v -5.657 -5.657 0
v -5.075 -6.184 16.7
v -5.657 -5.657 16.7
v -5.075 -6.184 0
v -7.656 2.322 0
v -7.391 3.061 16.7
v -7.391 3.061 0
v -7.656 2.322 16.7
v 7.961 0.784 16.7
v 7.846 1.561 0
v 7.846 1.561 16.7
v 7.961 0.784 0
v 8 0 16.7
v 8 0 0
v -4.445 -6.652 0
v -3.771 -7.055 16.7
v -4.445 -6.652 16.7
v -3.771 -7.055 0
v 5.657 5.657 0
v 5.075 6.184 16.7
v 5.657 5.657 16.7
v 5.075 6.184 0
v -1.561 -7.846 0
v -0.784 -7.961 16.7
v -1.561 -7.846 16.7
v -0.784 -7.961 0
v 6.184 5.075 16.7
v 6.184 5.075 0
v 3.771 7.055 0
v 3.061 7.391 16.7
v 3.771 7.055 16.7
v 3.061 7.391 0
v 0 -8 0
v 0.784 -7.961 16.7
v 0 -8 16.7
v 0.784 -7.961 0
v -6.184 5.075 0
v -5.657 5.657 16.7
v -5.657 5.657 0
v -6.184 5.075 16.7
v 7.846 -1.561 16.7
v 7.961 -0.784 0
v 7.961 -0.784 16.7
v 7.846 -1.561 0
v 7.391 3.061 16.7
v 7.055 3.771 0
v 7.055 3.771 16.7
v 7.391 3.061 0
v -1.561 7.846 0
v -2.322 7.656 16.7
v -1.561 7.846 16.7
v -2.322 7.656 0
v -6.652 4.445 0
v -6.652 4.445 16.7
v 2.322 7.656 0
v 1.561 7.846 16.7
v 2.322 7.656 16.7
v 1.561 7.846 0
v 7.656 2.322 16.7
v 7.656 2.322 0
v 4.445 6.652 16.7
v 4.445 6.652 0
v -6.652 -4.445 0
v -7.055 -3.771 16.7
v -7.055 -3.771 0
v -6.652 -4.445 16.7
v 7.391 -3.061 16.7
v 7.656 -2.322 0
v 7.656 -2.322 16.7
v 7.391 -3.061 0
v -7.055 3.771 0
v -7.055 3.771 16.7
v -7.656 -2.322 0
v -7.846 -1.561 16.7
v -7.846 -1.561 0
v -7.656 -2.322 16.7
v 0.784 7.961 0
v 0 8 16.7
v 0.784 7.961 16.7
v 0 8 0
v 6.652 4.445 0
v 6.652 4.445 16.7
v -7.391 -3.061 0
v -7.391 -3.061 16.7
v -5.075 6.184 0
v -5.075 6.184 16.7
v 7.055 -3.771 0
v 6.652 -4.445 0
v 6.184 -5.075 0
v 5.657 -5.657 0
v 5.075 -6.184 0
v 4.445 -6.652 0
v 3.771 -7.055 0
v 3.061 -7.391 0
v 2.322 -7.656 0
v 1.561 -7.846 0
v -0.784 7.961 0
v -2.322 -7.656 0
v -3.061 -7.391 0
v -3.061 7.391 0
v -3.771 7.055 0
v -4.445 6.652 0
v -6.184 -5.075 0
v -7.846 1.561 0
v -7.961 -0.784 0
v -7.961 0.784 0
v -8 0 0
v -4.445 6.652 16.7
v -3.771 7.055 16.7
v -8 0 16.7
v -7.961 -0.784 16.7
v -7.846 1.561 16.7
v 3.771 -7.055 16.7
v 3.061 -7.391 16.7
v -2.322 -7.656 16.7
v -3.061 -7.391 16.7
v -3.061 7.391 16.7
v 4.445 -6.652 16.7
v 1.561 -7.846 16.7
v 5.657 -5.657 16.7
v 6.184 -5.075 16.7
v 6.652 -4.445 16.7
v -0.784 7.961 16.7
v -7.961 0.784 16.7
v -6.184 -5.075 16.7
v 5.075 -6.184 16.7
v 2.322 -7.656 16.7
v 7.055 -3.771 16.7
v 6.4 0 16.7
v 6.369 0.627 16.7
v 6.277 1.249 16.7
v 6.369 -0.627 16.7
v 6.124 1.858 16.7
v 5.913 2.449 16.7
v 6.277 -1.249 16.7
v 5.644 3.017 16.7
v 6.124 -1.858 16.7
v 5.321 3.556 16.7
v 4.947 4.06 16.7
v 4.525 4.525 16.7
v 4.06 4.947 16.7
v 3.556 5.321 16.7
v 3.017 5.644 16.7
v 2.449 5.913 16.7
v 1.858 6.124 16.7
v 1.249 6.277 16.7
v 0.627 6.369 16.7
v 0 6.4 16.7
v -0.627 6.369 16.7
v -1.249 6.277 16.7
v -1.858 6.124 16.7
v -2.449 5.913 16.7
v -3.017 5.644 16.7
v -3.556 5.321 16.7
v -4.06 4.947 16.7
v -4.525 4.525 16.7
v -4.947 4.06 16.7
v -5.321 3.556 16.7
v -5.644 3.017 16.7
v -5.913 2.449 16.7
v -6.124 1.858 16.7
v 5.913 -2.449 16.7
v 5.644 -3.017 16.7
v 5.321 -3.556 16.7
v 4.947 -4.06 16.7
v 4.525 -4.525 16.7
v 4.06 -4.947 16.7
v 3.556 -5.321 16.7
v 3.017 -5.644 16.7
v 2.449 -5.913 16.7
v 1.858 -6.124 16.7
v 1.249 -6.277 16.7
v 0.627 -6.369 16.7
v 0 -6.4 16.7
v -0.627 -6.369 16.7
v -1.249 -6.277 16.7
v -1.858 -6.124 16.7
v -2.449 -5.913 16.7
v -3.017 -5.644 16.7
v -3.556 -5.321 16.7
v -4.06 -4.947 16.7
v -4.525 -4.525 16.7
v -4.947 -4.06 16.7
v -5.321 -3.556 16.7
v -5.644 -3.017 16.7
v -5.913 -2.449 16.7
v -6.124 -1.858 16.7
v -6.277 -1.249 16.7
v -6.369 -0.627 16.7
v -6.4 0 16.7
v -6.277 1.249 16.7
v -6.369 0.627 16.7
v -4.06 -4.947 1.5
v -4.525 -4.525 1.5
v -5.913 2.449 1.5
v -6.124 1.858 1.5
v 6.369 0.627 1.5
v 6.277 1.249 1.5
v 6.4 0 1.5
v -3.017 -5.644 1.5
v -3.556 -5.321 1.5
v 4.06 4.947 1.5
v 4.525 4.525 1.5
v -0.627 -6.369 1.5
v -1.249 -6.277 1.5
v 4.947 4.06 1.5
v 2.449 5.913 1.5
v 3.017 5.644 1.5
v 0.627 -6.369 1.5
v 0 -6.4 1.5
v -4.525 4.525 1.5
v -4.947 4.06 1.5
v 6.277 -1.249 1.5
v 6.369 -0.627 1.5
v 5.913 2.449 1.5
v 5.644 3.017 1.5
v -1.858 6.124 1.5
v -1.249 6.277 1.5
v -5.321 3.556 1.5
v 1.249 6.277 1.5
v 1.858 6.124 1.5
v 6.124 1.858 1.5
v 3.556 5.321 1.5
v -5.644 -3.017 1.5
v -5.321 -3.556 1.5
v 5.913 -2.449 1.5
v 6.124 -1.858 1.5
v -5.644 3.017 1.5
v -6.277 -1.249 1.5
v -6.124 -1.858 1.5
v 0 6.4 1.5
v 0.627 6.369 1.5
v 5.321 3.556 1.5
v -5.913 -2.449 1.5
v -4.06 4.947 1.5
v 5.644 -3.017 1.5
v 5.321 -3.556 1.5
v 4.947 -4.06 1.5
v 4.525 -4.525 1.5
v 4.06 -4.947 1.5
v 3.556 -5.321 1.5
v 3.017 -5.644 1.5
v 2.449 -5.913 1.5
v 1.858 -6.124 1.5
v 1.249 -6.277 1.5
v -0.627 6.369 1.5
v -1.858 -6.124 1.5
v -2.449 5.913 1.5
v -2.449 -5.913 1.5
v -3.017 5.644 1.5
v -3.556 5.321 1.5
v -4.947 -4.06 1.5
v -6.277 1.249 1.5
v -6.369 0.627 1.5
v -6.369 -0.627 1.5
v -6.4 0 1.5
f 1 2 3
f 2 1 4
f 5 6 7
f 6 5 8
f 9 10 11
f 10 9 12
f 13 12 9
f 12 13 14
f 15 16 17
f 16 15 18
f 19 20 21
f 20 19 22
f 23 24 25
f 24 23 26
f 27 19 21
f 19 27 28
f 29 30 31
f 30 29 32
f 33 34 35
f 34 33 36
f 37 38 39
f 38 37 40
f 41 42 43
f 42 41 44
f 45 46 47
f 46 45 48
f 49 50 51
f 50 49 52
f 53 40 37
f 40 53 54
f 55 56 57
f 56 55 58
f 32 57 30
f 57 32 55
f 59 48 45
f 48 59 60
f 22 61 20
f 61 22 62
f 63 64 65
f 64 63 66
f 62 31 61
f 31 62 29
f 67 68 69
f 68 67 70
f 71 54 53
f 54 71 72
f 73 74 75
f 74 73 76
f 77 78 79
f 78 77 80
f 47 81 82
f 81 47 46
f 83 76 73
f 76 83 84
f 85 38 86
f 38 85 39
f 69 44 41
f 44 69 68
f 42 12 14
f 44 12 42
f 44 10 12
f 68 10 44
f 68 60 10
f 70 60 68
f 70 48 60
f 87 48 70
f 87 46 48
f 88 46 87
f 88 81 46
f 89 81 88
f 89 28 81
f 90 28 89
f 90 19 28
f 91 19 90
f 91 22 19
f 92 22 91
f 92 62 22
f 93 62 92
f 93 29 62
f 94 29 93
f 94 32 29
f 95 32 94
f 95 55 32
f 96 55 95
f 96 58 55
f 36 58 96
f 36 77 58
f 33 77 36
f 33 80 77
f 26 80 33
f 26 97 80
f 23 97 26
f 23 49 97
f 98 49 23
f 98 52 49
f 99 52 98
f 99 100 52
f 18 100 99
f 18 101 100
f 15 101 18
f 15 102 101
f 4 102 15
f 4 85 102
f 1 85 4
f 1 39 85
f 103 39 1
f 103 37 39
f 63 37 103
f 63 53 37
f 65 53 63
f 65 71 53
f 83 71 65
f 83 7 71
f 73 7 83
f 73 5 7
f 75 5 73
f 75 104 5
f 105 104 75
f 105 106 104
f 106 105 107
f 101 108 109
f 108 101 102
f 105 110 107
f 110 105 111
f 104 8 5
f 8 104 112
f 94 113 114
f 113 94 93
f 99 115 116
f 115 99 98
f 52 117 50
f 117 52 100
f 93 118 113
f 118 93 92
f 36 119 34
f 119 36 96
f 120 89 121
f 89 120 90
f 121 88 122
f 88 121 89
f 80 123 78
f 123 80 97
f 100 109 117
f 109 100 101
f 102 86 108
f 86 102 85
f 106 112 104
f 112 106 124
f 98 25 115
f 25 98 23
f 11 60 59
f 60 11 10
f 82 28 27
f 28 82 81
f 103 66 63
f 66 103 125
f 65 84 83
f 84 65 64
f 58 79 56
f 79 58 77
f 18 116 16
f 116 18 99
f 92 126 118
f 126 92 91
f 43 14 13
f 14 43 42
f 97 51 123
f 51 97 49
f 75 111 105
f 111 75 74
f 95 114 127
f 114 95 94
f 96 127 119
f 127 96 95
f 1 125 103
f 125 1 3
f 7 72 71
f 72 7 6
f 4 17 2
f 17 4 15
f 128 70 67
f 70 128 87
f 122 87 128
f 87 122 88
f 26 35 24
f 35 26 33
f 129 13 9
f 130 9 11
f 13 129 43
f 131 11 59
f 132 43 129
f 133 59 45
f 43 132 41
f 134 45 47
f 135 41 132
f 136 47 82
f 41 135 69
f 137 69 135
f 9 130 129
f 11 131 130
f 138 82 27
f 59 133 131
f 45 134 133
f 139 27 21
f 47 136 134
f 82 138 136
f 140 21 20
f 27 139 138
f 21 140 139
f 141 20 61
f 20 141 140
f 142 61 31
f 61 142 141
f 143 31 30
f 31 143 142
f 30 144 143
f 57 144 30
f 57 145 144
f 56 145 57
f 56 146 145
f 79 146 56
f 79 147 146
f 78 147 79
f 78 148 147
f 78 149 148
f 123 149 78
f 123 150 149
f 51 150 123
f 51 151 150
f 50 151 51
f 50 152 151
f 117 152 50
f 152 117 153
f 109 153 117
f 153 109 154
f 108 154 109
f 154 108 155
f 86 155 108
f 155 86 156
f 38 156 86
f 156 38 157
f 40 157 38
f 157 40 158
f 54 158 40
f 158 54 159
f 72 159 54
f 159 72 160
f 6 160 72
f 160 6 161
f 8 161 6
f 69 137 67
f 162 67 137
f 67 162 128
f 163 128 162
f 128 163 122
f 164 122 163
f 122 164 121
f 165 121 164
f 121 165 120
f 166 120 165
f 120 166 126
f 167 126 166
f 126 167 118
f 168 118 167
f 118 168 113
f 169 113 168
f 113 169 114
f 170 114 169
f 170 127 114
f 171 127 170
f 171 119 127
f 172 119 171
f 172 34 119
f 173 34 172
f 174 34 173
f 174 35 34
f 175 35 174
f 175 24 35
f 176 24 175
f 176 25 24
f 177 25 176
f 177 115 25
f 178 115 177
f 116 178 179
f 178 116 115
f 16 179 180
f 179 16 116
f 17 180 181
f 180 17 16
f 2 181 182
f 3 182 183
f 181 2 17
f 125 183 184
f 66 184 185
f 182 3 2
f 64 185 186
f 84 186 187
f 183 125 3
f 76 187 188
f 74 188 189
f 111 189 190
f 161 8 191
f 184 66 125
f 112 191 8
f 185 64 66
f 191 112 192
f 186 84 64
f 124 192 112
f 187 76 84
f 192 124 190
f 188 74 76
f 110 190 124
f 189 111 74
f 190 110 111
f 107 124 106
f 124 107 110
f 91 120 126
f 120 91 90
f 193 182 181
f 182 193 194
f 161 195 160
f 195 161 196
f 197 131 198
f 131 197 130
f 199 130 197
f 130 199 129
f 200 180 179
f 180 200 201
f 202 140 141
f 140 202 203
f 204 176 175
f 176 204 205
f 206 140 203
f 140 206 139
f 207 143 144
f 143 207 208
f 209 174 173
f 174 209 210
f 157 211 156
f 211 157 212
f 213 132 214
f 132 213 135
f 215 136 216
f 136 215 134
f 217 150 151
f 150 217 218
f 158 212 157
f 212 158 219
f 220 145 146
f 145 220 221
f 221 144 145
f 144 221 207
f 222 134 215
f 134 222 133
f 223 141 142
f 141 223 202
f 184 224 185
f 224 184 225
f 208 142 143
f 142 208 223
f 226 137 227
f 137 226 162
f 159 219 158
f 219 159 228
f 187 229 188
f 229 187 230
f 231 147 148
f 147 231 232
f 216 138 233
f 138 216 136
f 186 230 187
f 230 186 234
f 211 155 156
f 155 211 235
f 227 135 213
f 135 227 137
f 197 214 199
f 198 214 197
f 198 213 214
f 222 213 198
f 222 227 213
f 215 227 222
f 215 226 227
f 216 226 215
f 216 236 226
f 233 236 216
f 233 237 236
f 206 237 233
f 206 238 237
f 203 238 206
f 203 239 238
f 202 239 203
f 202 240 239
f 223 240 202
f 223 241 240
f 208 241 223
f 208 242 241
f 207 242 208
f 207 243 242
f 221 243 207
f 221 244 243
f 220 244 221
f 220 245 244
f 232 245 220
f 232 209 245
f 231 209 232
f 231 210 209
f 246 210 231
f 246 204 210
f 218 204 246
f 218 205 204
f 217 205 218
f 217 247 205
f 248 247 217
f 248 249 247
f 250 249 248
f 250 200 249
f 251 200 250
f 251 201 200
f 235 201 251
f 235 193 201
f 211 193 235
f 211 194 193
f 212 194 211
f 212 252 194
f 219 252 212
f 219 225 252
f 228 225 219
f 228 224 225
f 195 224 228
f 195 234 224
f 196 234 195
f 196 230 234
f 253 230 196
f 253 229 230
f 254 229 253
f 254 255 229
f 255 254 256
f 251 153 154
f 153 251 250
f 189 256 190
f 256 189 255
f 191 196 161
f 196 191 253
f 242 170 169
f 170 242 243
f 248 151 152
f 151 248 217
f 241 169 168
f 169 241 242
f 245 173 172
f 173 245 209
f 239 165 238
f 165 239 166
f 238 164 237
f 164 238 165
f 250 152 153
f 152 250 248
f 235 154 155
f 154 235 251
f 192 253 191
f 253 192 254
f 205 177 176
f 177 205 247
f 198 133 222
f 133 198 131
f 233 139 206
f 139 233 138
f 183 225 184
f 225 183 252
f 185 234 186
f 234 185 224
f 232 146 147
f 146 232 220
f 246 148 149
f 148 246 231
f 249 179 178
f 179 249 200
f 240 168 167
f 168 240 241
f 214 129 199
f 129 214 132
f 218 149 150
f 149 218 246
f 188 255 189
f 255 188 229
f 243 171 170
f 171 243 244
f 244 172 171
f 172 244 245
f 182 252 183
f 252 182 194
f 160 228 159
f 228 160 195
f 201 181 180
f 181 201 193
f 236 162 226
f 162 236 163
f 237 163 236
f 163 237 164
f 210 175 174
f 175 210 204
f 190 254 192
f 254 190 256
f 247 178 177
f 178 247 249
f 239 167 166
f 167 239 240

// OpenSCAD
// Stem socket for an imitation apple (apple-picking practice rig). Print in PLA or PETG. Drill a16mm installation well30mm deep from the stem shoulder.
// Recess the socket mouth13mm below the shoulder, leaving an actual open well above it;
// glue the16.7mm socket in with epoxy. See apple-installation-section.scad. A 1/2 x 1/8 in N42 disc magnet
// (K&J Magnetics D82) is glued into the bottom of the bore. The stem's 12.6 mm peg slides in until its steel disc rests
// on the magnet; the bore's walls carry the stem's bending. Units: mm.

outer_d = 16;
bore_d = 12.8;
bore_depth = 12;     // the peg's length
magnet_d = 12.8;
magnet_h = 3.2;      // 1/8 in
floor_h = 1.5;
$fn = 64;

difference() {
    cylinder(d = outer_d, h = floor_h + magnet_h + bore_depth);
    translate([0, 0, floor_h]) cylinder(d = magnet_d, h = magnet_h + 0.01);
    translate([0, 0, floor_h + magnet_h]) cylinder(d = bore_d, h = bore_depth + 1);
}
